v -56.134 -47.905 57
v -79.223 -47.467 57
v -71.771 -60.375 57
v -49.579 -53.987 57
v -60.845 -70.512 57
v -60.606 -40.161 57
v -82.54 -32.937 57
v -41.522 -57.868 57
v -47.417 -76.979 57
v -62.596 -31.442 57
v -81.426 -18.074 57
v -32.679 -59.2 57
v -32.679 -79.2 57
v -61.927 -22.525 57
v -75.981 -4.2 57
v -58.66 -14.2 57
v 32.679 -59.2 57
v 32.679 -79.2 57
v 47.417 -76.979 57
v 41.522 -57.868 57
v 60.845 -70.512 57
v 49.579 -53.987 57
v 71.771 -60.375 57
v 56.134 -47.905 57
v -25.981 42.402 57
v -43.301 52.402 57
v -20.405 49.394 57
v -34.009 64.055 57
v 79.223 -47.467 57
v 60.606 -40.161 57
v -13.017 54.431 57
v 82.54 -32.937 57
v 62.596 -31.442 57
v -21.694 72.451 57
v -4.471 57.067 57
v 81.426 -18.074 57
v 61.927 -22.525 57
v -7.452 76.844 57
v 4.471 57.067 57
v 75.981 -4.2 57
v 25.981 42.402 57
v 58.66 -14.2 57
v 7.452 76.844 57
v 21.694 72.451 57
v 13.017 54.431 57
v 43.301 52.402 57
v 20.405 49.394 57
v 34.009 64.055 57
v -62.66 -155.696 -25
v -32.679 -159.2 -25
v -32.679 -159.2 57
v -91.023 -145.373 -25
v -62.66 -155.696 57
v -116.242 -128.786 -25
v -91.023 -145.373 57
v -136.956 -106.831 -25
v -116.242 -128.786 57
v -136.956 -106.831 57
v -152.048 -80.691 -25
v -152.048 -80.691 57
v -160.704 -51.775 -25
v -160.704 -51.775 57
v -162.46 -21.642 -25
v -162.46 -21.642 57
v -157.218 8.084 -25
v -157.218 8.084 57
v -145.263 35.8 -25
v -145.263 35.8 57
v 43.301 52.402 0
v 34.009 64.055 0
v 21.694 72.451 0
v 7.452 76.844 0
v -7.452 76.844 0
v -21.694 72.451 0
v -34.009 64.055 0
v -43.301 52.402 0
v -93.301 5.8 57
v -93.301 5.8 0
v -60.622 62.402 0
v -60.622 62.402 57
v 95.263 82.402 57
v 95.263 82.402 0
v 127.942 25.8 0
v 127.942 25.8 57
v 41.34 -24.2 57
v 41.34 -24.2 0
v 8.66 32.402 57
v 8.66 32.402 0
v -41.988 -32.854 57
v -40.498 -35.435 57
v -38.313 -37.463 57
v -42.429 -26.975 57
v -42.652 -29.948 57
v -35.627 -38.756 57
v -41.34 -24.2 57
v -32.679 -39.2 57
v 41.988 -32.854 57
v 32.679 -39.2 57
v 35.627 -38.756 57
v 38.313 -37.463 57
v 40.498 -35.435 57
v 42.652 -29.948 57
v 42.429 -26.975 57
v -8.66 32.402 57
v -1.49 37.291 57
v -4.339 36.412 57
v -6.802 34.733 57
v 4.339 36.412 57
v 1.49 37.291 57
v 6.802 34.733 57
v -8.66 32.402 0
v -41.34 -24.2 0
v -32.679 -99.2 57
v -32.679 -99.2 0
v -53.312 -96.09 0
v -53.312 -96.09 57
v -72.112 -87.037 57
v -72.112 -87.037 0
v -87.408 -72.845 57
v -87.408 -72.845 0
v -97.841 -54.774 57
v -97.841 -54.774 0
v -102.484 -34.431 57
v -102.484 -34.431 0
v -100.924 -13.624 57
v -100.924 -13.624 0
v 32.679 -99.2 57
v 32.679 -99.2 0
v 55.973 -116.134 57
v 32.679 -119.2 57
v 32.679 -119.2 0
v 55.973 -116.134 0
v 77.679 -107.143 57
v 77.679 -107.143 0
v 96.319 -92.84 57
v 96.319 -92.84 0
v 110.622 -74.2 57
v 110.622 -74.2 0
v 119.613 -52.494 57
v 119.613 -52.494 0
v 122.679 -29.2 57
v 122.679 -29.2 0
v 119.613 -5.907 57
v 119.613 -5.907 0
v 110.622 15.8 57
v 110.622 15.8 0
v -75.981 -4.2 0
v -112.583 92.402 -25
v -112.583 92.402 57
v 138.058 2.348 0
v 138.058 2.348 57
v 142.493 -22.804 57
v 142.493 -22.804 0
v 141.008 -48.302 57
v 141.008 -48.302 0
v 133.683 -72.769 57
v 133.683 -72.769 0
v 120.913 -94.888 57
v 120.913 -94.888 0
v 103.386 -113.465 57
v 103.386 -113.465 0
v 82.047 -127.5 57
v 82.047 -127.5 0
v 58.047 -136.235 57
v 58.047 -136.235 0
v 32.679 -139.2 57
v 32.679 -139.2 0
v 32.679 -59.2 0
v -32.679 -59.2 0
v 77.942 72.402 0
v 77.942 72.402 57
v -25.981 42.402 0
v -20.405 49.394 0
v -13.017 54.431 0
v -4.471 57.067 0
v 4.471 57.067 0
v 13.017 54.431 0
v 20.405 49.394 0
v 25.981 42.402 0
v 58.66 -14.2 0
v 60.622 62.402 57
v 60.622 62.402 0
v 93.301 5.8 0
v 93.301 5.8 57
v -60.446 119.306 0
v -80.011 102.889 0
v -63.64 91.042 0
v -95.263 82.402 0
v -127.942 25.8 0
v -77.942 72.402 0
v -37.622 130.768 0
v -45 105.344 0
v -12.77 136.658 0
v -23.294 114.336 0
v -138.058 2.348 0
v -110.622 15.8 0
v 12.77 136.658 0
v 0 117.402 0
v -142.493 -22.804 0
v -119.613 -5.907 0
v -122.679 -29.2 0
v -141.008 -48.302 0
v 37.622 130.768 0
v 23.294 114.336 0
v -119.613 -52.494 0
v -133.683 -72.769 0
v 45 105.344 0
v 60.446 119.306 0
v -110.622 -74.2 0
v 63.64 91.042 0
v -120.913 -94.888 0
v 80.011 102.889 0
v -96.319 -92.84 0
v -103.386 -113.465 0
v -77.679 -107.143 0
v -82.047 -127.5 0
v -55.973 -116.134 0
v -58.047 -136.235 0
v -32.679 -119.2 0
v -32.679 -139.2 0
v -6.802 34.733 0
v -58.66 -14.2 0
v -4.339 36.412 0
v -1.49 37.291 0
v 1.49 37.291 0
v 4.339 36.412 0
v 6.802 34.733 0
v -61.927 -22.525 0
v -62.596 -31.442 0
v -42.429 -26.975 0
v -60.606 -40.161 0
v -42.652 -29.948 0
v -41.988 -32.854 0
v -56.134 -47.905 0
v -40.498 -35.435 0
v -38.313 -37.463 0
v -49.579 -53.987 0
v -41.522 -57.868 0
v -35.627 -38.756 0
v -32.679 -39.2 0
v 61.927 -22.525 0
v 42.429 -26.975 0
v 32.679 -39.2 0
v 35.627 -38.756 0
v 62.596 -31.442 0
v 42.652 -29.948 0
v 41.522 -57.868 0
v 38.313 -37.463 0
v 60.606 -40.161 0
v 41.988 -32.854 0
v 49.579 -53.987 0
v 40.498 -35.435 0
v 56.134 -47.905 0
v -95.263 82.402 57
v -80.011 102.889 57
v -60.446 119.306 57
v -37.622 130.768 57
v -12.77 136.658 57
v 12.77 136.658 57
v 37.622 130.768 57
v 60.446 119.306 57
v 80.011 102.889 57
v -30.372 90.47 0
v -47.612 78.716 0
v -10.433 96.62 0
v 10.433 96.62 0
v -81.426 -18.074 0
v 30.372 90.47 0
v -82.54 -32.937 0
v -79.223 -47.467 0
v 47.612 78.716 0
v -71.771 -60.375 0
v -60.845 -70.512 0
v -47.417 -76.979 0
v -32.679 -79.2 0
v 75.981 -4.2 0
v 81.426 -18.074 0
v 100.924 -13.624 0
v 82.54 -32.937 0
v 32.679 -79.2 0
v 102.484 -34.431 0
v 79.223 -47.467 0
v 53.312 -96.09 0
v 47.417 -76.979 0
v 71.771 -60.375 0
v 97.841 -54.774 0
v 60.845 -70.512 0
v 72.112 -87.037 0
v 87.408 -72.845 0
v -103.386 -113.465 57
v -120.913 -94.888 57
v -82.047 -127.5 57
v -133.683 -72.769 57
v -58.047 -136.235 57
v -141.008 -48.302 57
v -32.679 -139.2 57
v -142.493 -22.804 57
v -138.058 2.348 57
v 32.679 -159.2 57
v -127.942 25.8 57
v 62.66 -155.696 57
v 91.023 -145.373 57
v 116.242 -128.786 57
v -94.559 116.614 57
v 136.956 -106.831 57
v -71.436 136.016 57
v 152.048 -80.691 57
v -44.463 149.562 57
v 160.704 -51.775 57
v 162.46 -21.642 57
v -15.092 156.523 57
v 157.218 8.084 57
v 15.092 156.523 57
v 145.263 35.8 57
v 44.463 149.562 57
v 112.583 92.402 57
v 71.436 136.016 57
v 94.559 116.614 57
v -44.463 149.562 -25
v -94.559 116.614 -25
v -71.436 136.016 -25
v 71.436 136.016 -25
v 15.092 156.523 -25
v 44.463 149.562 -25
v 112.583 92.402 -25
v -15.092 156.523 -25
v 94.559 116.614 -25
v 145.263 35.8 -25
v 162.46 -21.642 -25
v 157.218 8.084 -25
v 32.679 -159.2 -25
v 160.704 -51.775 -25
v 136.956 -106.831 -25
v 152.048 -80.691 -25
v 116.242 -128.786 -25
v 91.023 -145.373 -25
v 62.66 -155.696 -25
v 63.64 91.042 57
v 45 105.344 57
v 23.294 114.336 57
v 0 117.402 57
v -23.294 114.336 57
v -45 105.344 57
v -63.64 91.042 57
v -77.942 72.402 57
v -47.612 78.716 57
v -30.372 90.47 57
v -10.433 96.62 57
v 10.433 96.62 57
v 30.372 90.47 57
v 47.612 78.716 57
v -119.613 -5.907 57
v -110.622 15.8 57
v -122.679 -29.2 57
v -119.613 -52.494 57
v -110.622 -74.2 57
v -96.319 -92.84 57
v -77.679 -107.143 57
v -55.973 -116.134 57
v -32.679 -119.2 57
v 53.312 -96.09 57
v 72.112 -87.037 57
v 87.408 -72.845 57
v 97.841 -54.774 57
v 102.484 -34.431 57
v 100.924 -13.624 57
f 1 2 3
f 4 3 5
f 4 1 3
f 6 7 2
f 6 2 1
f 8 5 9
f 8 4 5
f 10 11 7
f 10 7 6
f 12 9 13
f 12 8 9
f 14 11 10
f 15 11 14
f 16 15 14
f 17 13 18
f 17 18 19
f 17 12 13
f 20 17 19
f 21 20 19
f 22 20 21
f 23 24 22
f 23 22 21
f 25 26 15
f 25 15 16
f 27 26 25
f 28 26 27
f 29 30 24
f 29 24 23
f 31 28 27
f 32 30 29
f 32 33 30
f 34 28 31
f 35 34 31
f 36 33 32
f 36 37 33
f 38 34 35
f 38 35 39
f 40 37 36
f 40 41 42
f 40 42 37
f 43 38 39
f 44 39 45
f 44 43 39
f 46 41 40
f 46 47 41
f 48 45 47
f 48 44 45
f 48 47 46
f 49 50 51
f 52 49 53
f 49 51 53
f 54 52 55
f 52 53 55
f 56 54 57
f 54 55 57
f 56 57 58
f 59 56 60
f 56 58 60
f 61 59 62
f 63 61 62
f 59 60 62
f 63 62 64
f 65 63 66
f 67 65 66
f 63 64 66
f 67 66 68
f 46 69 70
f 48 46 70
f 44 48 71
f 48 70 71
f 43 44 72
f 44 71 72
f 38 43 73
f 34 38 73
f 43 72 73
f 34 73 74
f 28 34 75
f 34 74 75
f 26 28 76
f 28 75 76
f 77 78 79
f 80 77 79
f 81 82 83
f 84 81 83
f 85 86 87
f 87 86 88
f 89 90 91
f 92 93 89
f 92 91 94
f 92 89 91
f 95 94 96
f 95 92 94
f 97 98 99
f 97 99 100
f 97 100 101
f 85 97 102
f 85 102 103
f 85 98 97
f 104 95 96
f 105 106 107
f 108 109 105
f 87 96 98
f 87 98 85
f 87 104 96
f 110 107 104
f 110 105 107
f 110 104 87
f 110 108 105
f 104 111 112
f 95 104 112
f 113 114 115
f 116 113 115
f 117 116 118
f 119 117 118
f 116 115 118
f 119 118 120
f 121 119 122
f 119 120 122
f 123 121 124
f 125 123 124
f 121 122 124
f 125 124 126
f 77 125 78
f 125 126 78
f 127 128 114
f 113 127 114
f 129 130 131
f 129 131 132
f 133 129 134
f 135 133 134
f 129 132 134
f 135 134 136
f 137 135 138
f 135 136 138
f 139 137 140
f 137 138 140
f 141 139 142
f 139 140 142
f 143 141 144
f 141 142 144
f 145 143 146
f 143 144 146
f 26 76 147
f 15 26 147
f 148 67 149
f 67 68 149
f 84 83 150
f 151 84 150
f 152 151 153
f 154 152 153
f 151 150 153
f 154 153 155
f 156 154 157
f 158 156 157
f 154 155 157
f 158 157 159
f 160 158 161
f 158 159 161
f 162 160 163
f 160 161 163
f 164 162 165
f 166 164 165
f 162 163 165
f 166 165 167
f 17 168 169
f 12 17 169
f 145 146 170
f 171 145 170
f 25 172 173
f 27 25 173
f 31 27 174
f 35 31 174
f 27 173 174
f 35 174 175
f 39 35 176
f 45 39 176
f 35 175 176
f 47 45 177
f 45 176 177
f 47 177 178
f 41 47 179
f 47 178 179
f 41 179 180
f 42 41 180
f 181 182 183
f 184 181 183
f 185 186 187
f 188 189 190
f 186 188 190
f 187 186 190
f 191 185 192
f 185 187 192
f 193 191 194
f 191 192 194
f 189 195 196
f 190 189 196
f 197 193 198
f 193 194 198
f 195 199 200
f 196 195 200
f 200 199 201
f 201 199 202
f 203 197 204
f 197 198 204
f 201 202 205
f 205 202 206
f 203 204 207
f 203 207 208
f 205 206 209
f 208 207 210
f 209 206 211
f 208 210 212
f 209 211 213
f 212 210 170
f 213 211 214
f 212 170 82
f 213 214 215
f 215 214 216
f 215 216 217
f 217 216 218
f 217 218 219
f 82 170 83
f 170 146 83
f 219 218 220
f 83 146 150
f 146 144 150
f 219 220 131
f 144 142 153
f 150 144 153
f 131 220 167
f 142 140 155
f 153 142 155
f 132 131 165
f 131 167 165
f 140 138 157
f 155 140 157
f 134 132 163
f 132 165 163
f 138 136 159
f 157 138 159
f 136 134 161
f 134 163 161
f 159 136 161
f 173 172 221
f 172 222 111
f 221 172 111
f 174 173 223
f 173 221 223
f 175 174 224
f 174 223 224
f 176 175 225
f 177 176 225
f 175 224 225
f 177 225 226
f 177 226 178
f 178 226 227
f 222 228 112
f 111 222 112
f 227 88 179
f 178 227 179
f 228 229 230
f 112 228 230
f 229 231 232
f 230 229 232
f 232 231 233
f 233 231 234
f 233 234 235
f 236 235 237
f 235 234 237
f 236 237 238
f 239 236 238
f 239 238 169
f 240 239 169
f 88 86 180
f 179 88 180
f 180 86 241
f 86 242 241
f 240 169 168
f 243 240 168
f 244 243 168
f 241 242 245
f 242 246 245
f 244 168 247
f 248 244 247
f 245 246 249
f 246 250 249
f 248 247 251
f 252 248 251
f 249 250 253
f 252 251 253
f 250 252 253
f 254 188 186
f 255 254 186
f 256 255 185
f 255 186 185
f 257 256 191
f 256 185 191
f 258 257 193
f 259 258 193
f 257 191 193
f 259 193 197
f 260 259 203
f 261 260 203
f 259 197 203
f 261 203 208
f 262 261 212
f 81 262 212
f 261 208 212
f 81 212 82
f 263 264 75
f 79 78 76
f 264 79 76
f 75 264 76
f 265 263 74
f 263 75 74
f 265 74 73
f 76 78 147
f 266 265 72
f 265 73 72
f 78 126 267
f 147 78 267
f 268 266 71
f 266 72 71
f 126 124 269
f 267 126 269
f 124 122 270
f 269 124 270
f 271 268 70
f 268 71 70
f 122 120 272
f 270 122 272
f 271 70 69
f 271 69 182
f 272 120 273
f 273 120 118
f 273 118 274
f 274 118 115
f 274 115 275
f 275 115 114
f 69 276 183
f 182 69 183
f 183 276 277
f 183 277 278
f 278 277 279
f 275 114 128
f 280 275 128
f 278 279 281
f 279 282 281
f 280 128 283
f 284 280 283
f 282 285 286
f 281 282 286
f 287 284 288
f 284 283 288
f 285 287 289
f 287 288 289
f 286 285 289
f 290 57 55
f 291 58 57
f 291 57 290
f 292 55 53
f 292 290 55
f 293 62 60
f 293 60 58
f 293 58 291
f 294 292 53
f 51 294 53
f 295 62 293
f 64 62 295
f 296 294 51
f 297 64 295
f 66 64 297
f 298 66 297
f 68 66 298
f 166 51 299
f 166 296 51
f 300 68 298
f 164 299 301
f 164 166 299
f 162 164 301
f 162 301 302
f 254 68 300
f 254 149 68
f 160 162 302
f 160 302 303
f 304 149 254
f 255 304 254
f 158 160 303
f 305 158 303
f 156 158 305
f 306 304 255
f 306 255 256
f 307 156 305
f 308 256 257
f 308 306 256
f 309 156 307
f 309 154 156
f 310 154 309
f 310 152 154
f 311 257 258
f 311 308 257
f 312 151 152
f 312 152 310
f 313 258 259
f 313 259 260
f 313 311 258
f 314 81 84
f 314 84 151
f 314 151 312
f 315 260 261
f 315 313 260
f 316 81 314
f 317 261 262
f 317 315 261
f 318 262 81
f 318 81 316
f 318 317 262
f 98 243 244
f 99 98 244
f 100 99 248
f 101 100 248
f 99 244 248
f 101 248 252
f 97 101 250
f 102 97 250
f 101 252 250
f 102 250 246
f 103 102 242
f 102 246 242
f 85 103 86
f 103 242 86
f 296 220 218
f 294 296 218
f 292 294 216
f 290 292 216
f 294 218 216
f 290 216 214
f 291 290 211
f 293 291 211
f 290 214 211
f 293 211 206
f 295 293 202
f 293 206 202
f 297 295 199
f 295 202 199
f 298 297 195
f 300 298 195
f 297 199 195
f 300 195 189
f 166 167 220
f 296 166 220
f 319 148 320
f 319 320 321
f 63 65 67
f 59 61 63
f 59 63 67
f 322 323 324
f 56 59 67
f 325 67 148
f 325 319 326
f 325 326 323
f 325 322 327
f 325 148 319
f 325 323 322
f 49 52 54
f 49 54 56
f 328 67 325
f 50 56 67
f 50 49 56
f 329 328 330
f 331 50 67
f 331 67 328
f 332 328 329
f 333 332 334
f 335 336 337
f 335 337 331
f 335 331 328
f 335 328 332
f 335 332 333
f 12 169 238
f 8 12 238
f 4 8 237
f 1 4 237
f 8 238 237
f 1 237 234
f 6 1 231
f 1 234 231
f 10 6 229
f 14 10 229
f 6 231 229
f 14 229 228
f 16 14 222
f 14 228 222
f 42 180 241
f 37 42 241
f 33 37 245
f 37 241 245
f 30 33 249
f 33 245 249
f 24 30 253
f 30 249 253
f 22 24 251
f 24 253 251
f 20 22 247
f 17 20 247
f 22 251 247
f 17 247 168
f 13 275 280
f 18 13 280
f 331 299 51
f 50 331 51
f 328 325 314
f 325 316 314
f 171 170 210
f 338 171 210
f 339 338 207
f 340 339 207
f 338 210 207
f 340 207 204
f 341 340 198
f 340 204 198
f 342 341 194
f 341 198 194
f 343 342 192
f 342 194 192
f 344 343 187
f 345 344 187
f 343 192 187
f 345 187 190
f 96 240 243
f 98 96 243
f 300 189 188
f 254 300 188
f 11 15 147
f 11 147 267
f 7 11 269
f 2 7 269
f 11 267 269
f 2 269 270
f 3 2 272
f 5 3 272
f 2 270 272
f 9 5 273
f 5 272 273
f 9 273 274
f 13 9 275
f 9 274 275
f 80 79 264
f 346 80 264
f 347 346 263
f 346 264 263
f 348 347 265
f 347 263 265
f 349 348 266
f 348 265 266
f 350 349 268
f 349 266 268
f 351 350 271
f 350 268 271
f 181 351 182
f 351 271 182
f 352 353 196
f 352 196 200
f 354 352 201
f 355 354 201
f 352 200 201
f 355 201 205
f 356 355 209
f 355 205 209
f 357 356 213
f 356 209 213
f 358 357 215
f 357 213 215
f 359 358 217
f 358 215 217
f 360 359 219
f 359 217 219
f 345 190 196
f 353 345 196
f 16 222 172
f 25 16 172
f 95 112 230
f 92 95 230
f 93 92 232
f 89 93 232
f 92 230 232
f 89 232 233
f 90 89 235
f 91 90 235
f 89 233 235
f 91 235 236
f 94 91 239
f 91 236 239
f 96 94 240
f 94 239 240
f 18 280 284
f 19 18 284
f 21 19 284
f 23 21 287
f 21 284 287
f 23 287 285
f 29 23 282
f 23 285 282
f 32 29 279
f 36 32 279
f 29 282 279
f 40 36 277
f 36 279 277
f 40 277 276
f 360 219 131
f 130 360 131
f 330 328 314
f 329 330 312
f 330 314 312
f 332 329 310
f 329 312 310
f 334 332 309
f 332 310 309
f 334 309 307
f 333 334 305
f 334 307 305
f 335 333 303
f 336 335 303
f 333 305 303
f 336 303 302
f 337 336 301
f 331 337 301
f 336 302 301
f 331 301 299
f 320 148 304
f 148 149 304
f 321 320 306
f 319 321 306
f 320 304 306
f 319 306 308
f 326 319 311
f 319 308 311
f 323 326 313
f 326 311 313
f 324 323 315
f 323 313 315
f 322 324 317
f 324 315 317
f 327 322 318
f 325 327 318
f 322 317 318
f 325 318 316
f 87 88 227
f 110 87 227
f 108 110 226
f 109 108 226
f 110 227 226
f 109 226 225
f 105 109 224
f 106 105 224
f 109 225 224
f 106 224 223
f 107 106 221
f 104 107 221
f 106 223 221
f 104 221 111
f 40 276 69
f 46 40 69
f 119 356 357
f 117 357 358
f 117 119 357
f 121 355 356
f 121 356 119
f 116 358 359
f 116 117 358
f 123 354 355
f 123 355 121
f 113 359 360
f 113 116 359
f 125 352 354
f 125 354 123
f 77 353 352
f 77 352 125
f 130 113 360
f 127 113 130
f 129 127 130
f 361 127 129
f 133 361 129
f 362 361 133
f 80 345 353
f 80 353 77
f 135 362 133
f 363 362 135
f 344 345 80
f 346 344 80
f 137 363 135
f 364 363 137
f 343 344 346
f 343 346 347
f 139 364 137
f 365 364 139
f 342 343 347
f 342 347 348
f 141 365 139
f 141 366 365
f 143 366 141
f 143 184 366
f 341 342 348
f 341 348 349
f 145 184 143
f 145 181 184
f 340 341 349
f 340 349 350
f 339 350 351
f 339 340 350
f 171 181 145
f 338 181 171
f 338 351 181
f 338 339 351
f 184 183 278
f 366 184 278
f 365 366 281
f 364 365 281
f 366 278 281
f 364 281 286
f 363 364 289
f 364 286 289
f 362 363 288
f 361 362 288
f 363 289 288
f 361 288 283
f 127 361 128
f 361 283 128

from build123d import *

# Parameters (mm, degrees)
F1_DEPTH = 57
F3_DEPTH = 25


with BuildPart() as f1:
    # F0 (on Top) → F1 (new body)
    with BuildSketch(Plane.XY):
        with BuildLine():
            ThreePointArc((8.6602540378, 32.4022103819), (0, 37.4022103819), (-8.6602540378, 32.4022103819))
            Line((-8.6602540378, 32.4022103819), (-41.3397459622, -24.2003299966))
            ThreePointArc((-41.3397459622, -24.2003299966), (-41.3397459622, -34.2003299966), (-32.6794919243, -39.2003299966))
            Line((-32.6794919243, -39.2003299966), (32.6794919243, -39.2003299966))
            ThreePointArc((32.6794919243, -39.2003299966), (41.3397459622, -34.2003299966), (41.3397459622, -24.2003299966))
            Line((41.3397459622, -24.2003299966), (8.6602540378, 32.4022103819))
        make_face()
    extrude(amount=F1_DEPTH)



with BuildPart() as f1b:
    # F0 (on Top) → F1, piece 2 (new body)
    with BuildSketch(Plane.XY):
        with BuildLine():
            Line((75.9807621135, -4.2003299966), (43.3012701892, 52.4022103819))
            ThreePointArc((43.3012701892, 52.4022103819), (0, 77.4022103819), (-43.3012701892, 52.4022103819))
            Line((-43.3012701892, 52.4022103819), (-75.9807621135, -4.2003299966))
            ThreePointArc((-75.9807621135, -4.2003299966), (-75.9807621135, -54.2003299966), (-32.6794919243, -79.2003299966))
            Line((-32.6794919243, -79.2003299966), (32.6794919243, -79.2003299966))
            ThreePointArc((32.6794919243, -79.2003299966), (75.9807621135, -54.2003299966), (75.9807621135, -4.2003299966))
        make_face()
        with BuildLine():
            ThreePointArc((-25.9807621135, 42.4022103819), (0, 57.4022103819), (25.9807621135, 42.4022103819))
            Line((25.9807621135, 42.4022103819), (58.6602540378, -14.2003299966))
            ThreePointArc((58.6602540378, -14.2003299966), (58.6602540378, -44.2003299966), (32.6794919243, -59.2003299966))
            Line((32.6794919243, -59.2003299966), (-32.6794919243, -59.2003299966))
            ThreePointArc((-32.6794919243, -59.2003299966), (-58.6602540378, -44.2003299966), (-58.6602540378, -14.2003299966))
            Line((-58.6602540378, -14.2003299966), (-25.9807621135, 42.4022103819))
        make_face(mode=Mode.SUBTRACT)
    extrude(amount=F1_DEPTH)


with BuildPart() as f1c:
    # F0 (on Top) → F1, piece 3 (new body)
    with BuildSketch(Plane.XY):
        with BuildLine():
            Line((110.6217782649, 15.7996700034), (77.9422863406, 72.4022103819))
            ThreePointArc((77.9422863406, 72.4022103819), (0, 117.4022103819), (-77.9422863406, 72.4022103819))
            Line((-77.9422863406, 72.4022103819), (-110.6217782649, 15.7996700034))
            ThreePointArc((-110.6217782649, 15.7996700034), (-110.6217782649, -74.2003299966), (-32.6794919243, -119.2003299966))
            Line((-32.6794919243, -119.2003299966), (32.6794919243, -119.2003299966))
            ThreePointArc((32.6794919243, -119.2003299966), (110.6217782649, -74.2003299966), (110.6217782649, 15.7996700034))
        make_face()
        with BuildLine():
            ThreePointArc((-60.6217782649, 62.4022103819), (0, 97.4022103819), (60.6217782649, 62.4022103819))
            Line((60.6217782649, 62.4022103819), (93.3012701892, 5.7996700034))
            ThreePointArc((93.3012701892, 5.7996700034), (93.3012701892, -64.2003299966), (32.6794919243, -99.2003299966))
            Line((32.6794919243, -99.2003299966), (-32.6794919243, -99.2003299966))
            ThreePointArc((-32.6794919243, -99.2003299966), (-93.3012701892, -64.2003299966), (-93.3012701892, 5.7996700034))
            Line((-93.3012701892, 5.7996700034), (-60.6217782649, 62.4022103819))
        make_face(mode=Mode.SUBTRACT)
    extrude(amount=F1_DEPTH)


with BuildPart() as f1d:
    # F0 (on Top) → F1, piece 4 (new body)
    with BuildSketch(Plane.XY):
        with BuildLine():
            Line((145.2627944163, 35.7996700034), (112.583302492, 92.4022103819))
            ThreePointArc((112.583302492, 92.4022103819), (0, 157.4022103819), (-112.583302492, 92.4022103819))
            Line((-112.583302492, 92.4022103819), (-145.2627944163, 35.7996700034))
            ThreePointArc((-145.2627944163, 35.7996700034), (-145.2627944163, -94.2003299966), (-32.6794919243, -159.2003299966))
            Line((-32.6794919243, -159.2003299966), (32.6794919243, -159.2003299966))
            ThreePointArc((32.6794919243, -159.2003299966), (145.2627944163, -94.2003299966), (145.2627944163, 35.7996700034))
        make_face()
        with BuildLine():
            ThreePointArc((-95.2627944163, 82.4022103819), (0, 137.4022103819), (95.2627944163, 82.4022103819))
            Line((95.2627944163, 82.4022103819), (127.9422863406, 25.7996700034))
            ThreePointArc((127.9422863406, 25.7996700034), (127.9422863406, -84.2003299966), (32.6794919243, -139.2003299966))
            Line((32.6794919243, -139.2003299966), (-32.6794919243, -139.2003299966))
            ThreePointArc((-32.6794919243, -139.2003299966), (-127.9422863406, -84.2003299966), (-127.9422863406, 25.7996700034))
            Line((-127.9422863406, 25.7996700034), (-95.2627944163, 82.4022103819))
        make_face(mode=Mode.SUBTRACT)
    extrude(amount=F1_DEPTH)


with BuildPart() as f1_1:
    add(f1.part)

    add(f1b.part)  # F3 merges F1b

    add(f1c.part)  # F3 merges F1c

    add(f1d.part)  # F3 merges F1d
    # F2 (on face) → F3 (join)
    with BuildSketch(Plane(origin=(0, 0, 0), x_dir=(1, 0, 0), z_dir=(0, 0, -1))):
        with BuildLine():
            ThreePointArc((-32.6794919243, 159.2003299966), (-145.2627944163, 94.2003299966), (-145.2627944163, -35.7996700034))
            Line((-145.2627944163, -35.7996700034), (-112.583302492, -92.4022103819))
            ThreePointArc((-112.583302492, -92.4022103819), (0, -157.4022103819), (112.583302492, -92.4022103819))
            Line((112.583302492, -92.4022103819), (145.2627944163, -35.7996700034))
            ThreePointArc((145.2627944163, -35.7996700034), (145.2627944163, 94.2003299966), (32.6794919243, 159.2003299966))
            Line((32.6794919243, 159.2003299966), (-32.6794919243, 159.2003299966))
        make_face()
    extrude(amount=F3_DEPTH)


solid = f1_1.part
